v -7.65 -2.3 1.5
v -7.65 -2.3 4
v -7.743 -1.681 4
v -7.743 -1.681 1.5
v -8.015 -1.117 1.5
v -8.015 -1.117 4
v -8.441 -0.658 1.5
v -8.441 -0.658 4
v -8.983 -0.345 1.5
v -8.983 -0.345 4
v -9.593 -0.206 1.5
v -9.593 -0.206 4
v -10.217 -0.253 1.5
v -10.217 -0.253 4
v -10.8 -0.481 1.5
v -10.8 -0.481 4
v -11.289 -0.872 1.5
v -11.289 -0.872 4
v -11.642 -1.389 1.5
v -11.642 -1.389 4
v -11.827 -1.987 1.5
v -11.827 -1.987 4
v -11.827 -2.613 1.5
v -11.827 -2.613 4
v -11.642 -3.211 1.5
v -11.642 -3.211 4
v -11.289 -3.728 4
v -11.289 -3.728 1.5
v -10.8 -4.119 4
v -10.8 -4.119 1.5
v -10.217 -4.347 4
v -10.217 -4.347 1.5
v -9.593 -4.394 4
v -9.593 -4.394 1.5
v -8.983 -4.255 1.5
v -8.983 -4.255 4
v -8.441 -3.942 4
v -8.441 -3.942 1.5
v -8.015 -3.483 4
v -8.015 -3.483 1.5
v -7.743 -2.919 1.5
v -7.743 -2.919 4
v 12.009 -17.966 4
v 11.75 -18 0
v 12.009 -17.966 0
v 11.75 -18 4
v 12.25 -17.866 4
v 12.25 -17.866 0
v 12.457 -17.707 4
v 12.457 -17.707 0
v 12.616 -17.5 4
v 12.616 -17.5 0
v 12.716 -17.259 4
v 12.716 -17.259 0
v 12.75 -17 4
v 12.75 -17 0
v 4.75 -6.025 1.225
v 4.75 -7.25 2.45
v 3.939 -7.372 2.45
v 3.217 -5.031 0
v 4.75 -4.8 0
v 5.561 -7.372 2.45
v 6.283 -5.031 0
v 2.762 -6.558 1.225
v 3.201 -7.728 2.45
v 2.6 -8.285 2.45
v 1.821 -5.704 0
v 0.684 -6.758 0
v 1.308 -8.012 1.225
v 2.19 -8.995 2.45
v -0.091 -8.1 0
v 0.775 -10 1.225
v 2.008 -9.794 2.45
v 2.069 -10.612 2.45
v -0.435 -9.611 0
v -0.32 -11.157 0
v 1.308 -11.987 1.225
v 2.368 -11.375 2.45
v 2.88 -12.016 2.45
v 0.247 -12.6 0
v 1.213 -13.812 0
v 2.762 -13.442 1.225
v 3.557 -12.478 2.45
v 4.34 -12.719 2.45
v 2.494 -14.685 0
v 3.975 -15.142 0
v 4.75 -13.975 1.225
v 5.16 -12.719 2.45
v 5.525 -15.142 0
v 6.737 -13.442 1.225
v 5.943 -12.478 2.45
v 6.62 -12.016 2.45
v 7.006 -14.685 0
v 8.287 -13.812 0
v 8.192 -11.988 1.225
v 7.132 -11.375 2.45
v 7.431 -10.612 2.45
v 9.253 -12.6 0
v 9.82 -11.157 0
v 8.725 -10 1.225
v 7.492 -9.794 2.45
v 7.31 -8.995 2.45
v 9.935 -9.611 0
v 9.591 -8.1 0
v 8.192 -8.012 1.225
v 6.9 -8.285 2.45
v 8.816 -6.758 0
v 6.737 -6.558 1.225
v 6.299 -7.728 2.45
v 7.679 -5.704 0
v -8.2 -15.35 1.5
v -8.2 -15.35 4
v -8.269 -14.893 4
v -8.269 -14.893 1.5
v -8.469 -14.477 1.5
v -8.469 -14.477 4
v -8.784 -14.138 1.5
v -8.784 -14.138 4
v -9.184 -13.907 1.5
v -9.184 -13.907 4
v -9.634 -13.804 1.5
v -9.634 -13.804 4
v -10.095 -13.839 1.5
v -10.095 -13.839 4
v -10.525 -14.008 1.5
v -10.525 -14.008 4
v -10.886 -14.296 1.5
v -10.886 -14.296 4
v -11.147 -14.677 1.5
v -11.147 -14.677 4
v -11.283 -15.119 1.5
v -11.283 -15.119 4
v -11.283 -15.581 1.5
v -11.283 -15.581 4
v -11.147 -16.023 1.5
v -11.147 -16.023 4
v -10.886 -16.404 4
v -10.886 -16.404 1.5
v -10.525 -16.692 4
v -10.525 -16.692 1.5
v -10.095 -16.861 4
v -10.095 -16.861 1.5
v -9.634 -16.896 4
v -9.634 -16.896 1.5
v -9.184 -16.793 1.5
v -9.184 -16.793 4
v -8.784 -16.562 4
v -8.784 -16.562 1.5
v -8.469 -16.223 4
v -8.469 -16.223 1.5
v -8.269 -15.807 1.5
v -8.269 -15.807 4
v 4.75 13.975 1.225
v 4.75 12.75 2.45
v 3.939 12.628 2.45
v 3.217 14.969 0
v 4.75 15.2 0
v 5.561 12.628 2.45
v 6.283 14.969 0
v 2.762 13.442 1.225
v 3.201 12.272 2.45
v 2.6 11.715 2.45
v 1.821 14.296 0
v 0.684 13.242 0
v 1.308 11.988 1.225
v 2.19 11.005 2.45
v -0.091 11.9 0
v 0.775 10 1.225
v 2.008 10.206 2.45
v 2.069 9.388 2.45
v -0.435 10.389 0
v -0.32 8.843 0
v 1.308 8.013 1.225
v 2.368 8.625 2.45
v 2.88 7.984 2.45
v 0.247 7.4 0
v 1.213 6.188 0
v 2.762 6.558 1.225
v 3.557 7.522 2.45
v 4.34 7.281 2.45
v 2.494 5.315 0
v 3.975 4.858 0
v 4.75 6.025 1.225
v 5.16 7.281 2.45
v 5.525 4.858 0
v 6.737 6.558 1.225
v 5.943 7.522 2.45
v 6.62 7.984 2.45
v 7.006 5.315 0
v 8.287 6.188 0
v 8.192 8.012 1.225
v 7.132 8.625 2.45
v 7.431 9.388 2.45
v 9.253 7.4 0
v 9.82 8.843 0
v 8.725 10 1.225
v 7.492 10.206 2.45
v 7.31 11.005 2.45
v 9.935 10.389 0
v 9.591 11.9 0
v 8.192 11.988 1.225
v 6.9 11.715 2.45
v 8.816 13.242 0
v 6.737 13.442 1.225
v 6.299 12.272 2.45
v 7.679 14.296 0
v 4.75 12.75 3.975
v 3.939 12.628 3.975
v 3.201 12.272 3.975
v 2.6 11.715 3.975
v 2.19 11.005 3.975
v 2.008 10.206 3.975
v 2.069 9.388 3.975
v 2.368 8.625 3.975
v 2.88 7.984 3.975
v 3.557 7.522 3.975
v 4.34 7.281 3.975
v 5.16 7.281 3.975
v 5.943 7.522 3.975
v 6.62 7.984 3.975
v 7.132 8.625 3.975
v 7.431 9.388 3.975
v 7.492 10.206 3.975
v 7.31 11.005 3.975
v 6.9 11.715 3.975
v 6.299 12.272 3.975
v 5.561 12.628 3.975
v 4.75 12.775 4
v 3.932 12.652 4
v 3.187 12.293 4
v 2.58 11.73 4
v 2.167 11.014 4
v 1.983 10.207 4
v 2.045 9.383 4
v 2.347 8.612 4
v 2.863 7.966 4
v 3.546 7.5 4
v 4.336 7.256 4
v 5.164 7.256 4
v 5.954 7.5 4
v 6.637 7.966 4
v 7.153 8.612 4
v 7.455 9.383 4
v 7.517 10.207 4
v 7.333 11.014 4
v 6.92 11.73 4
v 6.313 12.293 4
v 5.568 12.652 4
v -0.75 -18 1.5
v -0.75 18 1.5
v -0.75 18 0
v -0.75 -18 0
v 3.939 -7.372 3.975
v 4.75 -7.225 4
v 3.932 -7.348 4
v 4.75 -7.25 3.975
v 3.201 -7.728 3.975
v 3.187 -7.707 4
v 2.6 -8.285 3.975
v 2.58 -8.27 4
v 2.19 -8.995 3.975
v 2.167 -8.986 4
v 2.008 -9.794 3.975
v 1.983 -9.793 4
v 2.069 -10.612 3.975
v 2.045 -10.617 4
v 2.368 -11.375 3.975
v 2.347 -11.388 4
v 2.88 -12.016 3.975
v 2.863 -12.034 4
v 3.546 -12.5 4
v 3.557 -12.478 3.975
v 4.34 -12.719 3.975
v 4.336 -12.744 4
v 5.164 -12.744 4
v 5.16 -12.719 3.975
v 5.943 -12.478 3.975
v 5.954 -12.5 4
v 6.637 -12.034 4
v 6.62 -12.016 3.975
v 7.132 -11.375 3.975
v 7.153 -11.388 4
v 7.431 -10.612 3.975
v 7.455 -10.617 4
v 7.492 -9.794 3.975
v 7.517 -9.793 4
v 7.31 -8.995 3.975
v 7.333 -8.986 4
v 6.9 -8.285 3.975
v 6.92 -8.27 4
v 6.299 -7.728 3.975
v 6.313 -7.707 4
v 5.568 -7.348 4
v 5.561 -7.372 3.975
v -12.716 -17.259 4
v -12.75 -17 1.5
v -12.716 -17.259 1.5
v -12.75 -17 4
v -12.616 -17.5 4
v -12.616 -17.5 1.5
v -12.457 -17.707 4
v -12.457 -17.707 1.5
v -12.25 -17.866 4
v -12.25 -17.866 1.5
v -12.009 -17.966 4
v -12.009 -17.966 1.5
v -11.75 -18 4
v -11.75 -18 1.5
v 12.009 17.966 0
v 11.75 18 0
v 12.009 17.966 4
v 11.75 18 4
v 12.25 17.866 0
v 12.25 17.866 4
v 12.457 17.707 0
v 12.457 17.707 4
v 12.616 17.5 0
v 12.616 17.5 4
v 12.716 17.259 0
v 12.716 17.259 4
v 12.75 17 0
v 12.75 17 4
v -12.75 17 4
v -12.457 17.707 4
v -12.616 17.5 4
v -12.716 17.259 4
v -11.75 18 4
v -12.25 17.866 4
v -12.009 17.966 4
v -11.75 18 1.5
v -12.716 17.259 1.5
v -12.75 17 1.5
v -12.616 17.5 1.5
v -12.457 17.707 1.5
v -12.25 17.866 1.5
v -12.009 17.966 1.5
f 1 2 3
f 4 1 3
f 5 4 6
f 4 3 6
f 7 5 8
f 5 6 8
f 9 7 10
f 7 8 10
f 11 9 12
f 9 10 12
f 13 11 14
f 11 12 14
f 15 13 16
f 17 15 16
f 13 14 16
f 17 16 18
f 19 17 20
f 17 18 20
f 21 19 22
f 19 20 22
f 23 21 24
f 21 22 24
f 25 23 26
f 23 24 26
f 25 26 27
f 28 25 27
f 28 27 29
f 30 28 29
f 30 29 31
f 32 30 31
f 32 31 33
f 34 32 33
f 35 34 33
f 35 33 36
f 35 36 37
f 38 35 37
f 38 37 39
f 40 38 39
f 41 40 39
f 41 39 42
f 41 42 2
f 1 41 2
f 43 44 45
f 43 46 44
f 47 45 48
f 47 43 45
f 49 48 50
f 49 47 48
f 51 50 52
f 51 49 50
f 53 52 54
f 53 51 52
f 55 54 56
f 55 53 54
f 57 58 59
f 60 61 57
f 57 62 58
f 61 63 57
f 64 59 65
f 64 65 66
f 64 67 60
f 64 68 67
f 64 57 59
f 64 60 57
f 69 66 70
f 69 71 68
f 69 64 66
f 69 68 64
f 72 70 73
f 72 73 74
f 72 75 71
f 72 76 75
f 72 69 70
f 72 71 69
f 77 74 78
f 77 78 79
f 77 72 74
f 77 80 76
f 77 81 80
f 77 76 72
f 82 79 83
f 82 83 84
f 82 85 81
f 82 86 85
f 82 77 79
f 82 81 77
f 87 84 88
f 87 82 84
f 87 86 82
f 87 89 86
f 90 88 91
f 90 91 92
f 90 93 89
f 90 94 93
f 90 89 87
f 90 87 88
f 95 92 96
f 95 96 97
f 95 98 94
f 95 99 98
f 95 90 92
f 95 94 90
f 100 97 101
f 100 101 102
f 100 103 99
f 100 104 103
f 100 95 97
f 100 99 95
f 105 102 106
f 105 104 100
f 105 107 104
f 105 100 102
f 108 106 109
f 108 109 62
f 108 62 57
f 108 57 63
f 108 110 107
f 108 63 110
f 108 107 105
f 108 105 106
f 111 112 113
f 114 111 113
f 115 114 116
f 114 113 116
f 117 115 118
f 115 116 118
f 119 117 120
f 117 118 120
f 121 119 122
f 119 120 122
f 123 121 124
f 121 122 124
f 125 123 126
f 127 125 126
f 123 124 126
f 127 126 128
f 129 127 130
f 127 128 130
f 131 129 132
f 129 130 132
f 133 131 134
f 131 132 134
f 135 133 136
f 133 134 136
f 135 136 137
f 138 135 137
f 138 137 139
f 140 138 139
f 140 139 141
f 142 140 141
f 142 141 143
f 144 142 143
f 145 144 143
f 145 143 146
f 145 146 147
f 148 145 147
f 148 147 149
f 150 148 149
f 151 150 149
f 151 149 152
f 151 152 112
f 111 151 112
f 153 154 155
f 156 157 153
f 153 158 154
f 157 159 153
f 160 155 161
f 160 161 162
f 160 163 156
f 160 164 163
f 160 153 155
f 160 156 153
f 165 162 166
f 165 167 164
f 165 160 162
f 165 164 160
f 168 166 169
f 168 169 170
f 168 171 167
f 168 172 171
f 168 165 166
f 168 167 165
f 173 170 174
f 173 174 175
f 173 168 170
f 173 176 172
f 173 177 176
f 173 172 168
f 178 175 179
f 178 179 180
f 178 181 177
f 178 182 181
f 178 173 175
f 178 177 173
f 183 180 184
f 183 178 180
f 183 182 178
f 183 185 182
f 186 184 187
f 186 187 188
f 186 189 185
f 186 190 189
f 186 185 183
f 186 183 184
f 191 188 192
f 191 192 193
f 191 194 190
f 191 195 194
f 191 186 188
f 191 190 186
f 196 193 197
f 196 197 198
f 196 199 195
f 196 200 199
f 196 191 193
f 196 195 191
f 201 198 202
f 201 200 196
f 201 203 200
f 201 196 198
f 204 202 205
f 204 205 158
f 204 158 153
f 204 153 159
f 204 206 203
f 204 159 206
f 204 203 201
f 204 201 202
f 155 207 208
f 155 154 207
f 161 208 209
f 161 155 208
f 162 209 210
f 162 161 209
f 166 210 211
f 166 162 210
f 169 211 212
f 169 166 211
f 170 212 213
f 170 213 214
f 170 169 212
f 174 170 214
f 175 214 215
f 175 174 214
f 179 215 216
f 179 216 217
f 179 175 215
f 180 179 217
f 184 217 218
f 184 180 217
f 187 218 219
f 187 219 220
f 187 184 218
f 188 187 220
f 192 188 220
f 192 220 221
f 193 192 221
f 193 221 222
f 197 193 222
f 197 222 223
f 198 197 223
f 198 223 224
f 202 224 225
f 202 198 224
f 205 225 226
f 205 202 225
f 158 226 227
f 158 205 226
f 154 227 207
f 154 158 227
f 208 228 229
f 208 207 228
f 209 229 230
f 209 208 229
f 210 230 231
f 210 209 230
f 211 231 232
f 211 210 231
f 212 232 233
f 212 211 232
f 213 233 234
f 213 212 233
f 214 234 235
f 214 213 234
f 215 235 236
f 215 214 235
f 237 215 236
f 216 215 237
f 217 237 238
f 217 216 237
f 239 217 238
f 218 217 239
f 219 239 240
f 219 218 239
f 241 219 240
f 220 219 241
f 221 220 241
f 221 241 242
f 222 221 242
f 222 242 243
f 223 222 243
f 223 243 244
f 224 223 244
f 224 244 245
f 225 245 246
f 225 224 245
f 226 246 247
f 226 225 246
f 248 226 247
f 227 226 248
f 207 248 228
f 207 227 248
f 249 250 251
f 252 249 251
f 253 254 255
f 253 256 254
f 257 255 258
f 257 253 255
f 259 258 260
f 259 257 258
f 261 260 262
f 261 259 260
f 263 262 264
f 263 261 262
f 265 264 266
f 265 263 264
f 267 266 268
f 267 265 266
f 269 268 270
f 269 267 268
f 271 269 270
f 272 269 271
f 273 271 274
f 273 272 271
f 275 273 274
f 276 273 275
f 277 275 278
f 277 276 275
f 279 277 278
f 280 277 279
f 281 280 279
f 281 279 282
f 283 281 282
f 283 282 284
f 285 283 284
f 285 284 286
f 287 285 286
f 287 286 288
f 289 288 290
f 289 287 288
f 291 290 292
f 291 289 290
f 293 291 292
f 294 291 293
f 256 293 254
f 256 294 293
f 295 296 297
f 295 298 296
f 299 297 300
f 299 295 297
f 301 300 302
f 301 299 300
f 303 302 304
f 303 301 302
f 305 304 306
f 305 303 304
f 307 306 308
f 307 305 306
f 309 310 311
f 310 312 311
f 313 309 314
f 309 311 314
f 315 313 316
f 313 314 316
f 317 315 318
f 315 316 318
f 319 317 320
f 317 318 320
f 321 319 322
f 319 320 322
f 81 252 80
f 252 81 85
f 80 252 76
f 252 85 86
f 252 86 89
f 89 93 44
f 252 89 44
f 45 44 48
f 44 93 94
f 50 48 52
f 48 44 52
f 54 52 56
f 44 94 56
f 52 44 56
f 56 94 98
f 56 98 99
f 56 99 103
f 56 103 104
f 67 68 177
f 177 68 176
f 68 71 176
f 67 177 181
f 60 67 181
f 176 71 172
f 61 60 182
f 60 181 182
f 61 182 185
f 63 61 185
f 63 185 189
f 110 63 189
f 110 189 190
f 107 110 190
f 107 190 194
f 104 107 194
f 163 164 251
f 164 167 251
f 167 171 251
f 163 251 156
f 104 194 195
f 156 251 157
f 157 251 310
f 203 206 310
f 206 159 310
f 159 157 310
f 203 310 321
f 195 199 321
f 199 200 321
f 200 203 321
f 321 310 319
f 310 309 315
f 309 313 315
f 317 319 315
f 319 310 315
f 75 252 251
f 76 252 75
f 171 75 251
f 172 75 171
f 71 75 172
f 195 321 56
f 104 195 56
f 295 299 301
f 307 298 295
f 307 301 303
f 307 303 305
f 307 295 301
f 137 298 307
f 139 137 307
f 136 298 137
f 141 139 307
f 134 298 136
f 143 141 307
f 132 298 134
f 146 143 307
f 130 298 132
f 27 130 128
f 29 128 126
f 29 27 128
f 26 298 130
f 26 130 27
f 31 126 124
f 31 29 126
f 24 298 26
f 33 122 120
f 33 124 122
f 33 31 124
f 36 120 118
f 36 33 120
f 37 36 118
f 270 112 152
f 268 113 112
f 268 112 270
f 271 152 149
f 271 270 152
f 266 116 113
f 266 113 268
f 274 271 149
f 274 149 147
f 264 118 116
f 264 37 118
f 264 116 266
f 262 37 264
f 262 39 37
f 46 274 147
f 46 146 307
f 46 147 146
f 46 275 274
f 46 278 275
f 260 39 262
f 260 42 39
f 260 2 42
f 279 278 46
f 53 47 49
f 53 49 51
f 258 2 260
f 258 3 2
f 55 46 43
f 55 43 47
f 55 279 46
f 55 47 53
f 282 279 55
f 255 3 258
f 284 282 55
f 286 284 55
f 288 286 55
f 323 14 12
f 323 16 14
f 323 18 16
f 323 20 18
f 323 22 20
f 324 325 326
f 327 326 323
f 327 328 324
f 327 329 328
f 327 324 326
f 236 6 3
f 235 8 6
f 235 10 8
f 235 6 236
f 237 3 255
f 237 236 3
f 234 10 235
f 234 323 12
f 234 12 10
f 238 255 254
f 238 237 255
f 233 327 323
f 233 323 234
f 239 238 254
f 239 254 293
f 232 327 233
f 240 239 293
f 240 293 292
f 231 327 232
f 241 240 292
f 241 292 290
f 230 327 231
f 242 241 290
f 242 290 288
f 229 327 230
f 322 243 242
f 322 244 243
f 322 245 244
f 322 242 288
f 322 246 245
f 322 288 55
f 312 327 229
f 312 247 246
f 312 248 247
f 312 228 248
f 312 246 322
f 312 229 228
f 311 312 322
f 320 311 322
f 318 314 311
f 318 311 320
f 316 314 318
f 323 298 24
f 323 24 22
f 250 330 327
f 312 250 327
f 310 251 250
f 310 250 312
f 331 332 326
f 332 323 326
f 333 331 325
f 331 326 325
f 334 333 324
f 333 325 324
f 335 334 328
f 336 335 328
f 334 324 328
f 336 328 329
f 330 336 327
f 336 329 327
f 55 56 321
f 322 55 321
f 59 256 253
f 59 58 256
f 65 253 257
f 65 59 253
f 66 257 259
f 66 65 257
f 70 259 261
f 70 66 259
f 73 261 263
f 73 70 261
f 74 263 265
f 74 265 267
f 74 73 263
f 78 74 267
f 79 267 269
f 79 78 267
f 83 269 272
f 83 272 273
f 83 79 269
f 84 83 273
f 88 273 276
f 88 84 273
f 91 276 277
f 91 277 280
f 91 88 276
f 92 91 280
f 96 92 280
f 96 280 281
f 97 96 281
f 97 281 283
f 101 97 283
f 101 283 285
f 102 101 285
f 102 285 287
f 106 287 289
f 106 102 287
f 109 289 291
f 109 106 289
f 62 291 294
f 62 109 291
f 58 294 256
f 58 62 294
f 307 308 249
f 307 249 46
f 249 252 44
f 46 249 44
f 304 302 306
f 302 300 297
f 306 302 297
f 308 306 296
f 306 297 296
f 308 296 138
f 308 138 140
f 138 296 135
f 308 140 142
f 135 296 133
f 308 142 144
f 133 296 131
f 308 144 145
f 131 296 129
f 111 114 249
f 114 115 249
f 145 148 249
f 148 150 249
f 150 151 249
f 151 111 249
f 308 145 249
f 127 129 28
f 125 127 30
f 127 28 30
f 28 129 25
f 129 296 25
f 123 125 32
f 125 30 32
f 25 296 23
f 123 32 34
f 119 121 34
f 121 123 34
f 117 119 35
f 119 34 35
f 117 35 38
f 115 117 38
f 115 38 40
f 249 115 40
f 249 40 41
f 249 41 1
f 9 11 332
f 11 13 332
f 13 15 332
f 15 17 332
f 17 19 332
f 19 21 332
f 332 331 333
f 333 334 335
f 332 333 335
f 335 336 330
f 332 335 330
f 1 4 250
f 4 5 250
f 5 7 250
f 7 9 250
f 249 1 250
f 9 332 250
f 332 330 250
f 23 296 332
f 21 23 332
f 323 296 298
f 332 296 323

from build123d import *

# Parameters (mm, degrees)
SKETCH1_W                                    = 25.5
SKETCH1_H                                    = 36
BOSS_EXTRUDE1_DEPTH                          = 4
CUT_EXTRUDE1_REACH                           = 40.4
SKETCH2_W                                    = 12
SKETCH2_H                                    = 1.5
CSK_FOR_M5_COUNTERSUNK_FLAT_HEAD_SCR_2_COUNT = 2
CSK_FOR_M5_COUNTERSUNK_FLAT_HEAD_SCR_2_PITCH = 20
M3_CLEARANCE_HOLE1_D                         = 3.1
HOLE1_D                                      = 4.2
FILLET1_R                                    = 1


with BuildPart() as part:
    # Sketch1 → Boss-Extrude1 (new body)
    with BuildSketch(Plane.XY):
        Rectangle(SKETCH1_W, SKETCH1_H)
    extrude(amount=BOSS_EXTRUDE1_DEPTH)

    # Sketch2 → Cut-Extrude1 (cut, up to next)
    with BuildSketch(Plane(origin=(0, 18, 0), x_dir=(1, 0, 0), z_dir=(0, 1, 0)), mode=Mode.PRIVATE) as cut_extrude1_sk1:
        with Locations((-6.75, -0.75)):
            Rectangle(SKETCH2_W, SKETCH2_H)
    cut_extrude1_tool1 = extrude(cut_extrude1_sk1.sketch, amount=-CUT_EXTRUDE1_REACH, mode=Mode.PRIVATE) & part.part
    add(cut_extrude1_tool1.solids().sort_by_distance((-6.75, 18, 0.75))[0], mode=Mode.SUBTRACT)

    # Sketch5 → CSK for M5 Countersunk Flat Head Screw1 (revolve, cut)
    with BuildSketch(Plane(origin=(4.75, 10, 0), x_dir=(0, 1, 0), z_dir=(1, 0, 0))):
        Polygon((0, 0), (0, 4), (2.775, 4), (2.75, 3.975), (2.75, 2.45), (5.2, 0), align=None)
    csk_for_m5_countersunk_flat_head_screw1 = revolve(axis=Axis((4.75, 10, -6.35), (0, 0, 1)), mode=Mode.SUBTRACT)

    # CSK for M5 Countersunk Flat Head Scr 2: CSK for M5 Countersunk Flat Head Screw1 ×2
    with Locations(*[(0, -i * CSK_FOR_M5_COUNTERSUNK_FLAT_HEAD_SCR_2_PITCH, 0) for i in range(1, CSK_FOR_M5_COUNTERSUNK_FLAT_HEAD_SCR_2_COUNT)]):
        add(csk_for_m5_countersunk_flat_head_screw1, mode=Mode.SUBTRACT)

    # M3 Clearance Hole1 (through all)
    with Locations(Plane(origin=(0, 0, 1.5), x_dir=(-1, 0, 0), z_dir=(0, 0, -1))):
        with Locations((9.75, -15.35)):
            Hole(M3_CLEARANCE_HOLE1_D / 2)

    # Hole1 (through all)
    with Locations(Plane(origin=(0, 0, 1.5), x_dir=(-1, 0, 0), z_dir=(0, 0, -1))):
        with Locations((9.75, -2.3)):
            Hole(HOLE1_D / 2)

    # Fillet1
    fillet1_edges = [part.edges().sort_by_distance(p)[0] for p in [
        (-12.75, 18, 2.75),
        (12.75, 18, 2),
        (12.75, -18, 2),
        (-12.75, -18, 2.75),
    ]]
    fillet(fillet1_edges, radius=FILLET1_R)


solid = part.part
